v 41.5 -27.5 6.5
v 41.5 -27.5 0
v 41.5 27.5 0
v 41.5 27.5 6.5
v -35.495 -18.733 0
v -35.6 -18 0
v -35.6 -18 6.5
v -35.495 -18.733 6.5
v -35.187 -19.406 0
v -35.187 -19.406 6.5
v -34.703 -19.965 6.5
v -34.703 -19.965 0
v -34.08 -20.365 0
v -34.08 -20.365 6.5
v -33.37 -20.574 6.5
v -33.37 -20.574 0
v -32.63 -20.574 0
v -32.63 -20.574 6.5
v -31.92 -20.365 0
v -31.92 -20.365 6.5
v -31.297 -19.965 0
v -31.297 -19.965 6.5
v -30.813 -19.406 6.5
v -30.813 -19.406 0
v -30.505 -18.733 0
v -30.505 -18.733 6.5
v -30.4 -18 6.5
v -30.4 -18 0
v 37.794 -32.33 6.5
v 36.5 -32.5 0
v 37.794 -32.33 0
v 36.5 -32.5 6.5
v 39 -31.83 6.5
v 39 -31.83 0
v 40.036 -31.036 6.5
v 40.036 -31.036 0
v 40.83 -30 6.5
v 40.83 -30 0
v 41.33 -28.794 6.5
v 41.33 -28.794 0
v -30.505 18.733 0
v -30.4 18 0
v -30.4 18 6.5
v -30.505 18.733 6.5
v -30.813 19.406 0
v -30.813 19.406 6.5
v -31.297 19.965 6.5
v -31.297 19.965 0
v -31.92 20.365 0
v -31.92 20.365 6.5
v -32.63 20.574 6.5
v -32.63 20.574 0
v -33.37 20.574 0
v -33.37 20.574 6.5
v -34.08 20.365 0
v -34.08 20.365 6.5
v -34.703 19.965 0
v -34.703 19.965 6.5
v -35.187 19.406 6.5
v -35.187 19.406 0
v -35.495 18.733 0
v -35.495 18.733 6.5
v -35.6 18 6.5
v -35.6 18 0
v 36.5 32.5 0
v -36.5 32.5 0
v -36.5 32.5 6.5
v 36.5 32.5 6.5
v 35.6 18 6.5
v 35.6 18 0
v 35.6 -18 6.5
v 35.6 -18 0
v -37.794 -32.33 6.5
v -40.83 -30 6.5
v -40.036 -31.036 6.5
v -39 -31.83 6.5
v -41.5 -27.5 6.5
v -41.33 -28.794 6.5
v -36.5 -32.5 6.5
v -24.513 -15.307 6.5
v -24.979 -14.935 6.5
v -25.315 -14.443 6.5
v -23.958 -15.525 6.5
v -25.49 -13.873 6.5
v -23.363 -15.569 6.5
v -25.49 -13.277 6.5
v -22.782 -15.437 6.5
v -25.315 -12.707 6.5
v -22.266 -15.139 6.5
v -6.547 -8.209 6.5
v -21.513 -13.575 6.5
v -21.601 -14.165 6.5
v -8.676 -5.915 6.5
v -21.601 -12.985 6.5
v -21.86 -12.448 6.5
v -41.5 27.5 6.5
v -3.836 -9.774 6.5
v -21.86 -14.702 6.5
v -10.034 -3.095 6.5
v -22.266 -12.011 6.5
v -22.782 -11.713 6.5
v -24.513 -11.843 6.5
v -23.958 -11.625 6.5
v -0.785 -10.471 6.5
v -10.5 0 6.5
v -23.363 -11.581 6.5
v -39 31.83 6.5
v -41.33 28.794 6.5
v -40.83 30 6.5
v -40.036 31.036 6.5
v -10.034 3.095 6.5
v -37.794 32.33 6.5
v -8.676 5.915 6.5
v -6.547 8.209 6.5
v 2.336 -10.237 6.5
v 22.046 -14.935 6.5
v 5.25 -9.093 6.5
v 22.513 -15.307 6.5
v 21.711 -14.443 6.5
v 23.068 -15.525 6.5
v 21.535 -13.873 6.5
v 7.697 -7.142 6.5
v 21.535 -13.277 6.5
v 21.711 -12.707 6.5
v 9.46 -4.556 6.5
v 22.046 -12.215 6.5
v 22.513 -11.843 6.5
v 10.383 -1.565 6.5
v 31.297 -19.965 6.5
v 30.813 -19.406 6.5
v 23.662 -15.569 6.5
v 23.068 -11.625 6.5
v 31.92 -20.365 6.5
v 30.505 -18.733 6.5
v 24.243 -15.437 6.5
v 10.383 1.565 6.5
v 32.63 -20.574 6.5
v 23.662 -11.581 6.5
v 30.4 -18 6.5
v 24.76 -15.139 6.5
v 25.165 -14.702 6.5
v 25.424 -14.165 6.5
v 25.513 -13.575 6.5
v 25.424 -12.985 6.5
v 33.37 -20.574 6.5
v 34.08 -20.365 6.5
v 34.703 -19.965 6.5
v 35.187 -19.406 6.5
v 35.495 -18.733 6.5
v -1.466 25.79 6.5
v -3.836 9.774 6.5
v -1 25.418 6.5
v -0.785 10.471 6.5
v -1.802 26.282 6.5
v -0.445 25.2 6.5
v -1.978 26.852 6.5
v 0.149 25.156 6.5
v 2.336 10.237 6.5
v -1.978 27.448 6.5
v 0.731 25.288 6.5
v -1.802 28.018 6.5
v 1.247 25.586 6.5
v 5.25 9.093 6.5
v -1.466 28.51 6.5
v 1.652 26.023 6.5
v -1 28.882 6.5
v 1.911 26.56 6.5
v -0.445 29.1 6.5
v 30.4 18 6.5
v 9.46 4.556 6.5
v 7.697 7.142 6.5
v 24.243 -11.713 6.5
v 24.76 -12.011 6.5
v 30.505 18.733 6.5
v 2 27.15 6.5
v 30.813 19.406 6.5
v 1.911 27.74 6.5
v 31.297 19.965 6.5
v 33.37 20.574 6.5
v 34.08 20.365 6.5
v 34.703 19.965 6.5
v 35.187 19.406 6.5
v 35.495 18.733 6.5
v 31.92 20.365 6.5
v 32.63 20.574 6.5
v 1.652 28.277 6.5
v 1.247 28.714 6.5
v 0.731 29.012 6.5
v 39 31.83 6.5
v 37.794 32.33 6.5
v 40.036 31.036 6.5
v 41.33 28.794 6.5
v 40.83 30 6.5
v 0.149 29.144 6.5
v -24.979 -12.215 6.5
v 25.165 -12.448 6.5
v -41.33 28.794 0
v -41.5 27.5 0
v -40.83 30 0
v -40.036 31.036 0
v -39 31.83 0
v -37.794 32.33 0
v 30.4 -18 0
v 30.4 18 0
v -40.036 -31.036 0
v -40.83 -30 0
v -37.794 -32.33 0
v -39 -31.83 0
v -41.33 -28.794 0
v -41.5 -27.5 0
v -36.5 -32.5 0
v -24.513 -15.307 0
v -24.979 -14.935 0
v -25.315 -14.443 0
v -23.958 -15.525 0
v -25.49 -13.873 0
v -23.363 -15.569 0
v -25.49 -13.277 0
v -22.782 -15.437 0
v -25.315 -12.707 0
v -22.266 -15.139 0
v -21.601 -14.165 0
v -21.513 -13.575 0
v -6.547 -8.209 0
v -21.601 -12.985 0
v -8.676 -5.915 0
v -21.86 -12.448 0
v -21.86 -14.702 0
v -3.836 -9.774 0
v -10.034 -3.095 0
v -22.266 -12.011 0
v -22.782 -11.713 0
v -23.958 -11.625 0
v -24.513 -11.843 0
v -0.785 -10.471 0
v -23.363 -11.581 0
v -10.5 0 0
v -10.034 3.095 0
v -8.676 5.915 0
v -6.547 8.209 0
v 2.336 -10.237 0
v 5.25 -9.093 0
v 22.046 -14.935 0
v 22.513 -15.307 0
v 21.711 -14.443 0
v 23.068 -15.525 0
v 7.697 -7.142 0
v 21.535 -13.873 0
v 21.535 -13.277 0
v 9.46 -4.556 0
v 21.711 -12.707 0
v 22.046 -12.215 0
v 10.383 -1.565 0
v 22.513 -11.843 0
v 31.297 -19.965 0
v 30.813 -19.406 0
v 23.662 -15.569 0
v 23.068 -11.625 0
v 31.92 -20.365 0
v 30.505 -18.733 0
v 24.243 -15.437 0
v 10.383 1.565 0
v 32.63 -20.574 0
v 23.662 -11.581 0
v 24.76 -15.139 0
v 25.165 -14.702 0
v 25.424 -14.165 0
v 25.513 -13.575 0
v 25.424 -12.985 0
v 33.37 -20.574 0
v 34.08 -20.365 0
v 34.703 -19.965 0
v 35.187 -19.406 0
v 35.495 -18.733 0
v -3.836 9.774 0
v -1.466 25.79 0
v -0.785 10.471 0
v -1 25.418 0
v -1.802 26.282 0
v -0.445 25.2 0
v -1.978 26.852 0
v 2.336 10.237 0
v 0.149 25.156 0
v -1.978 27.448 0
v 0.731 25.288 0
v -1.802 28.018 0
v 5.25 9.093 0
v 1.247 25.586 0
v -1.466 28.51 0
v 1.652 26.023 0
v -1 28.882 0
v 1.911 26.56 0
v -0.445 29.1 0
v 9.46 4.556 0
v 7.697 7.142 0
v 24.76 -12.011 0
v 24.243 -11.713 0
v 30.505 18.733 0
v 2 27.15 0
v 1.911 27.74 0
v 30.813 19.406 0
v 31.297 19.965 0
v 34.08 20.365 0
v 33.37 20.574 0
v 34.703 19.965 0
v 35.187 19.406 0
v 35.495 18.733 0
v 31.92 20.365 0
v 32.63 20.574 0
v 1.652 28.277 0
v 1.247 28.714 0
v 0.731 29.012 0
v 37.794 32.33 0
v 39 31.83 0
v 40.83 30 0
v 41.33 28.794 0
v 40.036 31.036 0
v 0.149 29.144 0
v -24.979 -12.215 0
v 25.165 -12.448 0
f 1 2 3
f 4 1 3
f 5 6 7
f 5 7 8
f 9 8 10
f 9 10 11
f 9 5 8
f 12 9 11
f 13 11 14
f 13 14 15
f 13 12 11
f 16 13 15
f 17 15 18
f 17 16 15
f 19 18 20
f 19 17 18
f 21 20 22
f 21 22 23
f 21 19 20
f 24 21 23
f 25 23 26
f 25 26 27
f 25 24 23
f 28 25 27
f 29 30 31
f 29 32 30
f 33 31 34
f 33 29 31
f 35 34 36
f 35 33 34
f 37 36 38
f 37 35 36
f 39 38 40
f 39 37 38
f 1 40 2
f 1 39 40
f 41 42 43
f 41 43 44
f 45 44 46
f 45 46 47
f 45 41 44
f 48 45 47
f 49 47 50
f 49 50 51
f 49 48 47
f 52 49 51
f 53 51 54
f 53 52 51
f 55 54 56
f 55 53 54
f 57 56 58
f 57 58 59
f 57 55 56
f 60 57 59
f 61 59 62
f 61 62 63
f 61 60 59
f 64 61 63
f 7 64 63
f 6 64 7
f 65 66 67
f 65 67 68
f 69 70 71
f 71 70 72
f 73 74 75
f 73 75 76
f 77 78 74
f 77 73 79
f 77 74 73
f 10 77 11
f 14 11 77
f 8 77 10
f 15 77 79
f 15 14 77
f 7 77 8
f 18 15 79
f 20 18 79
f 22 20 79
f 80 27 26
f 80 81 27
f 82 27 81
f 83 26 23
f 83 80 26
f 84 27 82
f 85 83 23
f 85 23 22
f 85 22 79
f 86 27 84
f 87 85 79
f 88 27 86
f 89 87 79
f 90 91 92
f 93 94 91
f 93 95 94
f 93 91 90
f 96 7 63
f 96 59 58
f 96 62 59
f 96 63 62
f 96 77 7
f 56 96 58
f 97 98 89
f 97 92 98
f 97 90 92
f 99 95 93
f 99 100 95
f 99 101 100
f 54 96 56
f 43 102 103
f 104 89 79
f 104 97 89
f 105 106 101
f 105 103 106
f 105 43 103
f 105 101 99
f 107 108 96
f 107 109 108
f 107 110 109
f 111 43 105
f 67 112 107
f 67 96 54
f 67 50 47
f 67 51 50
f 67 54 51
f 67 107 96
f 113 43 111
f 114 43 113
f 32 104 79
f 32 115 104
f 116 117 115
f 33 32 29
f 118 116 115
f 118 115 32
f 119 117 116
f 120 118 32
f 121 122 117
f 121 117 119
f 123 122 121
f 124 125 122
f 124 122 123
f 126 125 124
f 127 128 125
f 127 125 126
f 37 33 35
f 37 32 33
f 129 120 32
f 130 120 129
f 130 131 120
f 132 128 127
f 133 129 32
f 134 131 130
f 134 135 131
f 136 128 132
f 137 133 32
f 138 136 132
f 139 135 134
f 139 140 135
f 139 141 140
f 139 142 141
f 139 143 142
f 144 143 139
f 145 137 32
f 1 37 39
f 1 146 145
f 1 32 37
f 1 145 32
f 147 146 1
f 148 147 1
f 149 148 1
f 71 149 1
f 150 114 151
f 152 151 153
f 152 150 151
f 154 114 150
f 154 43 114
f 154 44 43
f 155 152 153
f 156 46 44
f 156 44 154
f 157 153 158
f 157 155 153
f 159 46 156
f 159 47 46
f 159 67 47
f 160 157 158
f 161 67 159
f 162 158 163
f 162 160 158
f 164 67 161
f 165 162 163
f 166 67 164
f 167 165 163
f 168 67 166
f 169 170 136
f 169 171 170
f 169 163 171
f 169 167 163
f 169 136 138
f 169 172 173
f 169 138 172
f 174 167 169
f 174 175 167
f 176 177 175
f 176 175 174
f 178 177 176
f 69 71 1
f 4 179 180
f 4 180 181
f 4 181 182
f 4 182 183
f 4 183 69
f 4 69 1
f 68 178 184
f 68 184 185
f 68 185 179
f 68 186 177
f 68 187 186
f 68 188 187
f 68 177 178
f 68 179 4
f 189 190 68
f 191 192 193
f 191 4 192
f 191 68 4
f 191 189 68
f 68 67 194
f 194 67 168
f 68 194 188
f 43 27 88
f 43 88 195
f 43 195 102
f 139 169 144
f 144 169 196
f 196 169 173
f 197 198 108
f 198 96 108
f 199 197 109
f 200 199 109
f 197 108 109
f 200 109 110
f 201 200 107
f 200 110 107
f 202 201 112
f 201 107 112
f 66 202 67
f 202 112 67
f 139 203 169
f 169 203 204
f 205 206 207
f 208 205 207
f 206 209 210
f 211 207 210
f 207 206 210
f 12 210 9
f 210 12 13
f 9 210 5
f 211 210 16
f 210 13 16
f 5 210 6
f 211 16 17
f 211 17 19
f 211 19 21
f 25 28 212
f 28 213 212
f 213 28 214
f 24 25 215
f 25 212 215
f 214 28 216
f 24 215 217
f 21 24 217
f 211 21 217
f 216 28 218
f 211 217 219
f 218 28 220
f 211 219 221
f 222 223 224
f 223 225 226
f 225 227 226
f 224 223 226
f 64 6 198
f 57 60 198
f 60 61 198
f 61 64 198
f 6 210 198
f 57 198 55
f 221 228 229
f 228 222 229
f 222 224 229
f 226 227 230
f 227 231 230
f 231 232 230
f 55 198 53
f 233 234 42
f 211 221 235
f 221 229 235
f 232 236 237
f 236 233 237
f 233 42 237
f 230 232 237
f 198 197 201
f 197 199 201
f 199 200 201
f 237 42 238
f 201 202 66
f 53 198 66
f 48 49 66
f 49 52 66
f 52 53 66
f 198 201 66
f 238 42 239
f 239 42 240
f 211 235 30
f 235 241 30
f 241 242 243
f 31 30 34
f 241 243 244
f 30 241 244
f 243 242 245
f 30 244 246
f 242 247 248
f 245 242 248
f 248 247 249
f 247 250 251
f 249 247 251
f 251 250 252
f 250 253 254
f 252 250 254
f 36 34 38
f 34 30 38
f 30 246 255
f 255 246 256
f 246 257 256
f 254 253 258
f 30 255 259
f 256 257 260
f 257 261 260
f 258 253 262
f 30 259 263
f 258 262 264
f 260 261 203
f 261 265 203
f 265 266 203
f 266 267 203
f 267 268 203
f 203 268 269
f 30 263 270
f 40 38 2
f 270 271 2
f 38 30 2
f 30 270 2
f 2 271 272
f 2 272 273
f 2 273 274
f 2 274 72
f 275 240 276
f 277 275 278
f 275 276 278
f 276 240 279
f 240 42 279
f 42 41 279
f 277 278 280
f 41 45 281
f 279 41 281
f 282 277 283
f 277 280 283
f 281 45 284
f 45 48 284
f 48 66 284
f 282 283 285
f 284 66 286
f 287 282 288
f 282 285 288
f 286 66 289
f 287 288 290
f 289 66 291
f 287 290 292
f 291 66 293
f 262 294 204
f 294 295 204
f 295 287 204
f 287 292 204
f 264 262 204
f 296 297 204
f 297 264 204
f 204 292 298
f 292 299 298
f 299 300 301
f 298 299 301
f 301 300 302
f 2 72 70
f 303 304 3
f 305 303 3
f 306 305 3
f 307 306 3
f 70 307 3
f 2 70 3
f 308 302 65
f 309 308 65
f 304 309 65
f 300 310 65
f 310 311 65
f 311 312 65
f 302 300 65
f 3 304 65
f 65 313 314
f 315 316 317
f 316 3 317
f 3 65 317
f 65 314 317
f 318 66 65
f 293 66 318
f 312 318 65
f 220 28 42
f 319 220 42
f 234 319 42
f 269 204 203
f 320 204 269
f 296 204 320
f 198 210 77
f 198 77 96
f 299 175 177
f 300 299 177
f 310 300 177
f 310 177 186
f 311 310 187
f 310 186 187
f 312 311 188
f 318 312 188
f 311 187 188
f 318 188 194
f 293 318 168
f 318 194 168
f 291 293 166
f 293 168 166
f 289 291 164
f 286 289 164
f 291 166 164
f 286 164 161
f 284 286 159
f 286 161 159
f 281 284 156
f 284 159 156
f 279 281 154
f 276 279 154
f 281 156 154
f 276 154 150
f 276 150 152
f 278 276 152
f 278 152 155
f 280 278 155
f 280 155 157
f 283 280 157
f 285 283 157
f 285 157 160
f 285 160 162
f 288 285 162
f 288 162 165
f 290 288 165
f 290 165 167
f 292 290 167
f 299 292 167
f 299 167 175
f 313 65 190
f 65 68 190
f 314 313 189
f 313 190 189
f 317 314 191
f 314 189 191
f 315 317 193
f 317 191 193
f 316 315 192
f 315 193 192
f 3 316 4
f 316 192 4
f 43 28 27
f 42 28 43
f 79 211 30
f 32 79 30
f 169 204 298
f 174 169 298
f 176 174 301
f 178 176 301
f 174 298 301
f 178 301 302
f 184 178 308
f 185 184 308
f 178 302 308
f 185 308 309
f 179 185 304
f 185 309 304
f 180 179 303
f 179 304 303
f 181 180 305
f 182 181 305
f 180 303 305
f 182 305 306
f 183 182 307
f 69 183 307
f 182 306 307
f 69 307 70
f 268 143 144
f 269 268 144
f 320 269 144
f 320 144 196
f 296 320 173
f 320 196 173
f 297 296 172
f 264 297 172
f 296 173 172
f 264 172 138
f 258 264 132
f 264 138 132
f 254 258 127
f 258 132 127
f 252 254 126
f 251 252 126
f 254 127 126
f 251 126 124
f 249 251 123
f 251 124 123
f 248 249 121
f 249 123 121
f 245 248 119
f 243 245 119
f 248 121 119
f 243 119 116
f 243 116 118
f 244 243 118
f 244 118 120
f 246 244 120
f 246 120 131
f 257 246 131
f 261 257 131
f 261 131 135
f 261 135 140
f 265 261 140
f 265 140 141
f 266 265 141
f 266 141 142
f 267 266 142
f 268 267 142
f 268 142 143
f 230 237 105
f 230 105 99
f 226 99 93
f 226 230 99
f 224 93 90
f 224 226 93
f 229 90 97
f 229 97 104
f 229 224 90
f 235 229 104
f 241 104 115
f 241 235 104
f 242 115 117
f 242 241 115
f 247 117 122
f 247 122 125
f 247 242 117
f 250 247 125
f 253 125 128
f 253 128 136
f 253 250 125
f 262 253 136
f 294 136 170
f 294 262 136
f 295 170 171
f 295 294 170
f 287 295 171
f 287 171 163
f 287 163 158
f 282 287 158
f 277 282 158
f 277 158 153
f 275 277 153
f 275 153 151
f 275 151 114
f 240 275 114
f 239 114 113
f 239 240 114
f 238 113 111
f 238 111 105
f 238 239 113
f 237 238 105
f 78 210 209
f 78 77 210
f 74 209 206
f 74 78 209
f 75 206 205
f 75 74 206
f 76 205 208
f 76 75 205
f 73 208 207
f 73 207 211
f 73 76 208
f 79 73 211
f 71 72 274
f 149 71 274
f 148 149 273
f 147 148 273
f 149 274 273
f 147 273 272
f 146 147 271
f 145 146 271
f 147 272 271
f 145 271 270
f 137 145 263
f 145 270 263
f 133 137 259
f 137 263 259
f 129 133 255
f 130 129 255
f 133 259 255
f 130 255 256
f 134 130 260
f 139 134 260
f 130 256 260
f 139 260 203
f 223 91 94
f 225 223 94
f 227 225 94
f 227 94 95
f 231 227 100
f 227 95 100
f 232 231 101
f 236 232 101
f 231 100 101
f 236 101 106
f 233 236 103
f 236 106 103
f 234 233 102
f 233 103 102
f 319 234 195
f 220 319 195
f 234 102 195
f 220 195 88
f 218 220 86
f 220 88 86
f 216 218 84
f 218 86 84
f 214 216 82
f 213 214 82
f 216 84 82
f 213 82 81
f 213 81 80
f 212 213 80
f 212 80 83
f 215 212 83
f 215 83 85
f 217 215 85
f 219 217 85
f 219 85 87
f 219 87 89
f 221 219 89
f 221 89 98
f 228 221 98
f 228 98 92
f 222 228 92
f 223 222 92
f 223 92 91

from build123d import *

# Parameters (mm, degrees)
SKETCH1_W           = 83
SKETCH1_H           = 65
SKETCH1_R           = 10.5
BOSS_EXTRUDE1_DEPTH = 6.5
FILLET1_R           = 5
SKETCH2_R           = 2
CUT_EXTRUDE1_DEPTH  = 10


with BuildPart() as part:
    # Sketch1 → Boss-Extrude1 (new body)
    with BuildSketch(Plane.XY):
        Rectangle(SKETCH1_W, SKETCH1_H)
        with Locations(Location((0, 0, 0), (0, 0, 180))):
            Circle(SKETCH1_R, mode=Mode.SUBTRACT)
        with BuildLine():
            Line((30.4, -18), (30.4, 18))
            ThreePointArc((30.4, 18), (33, 20.6), (35.6, 18))
            Line((35.6, 18), (35.6, -18))
            ThreePointArc((35.6, -18), (33, -20.6), (30.4, -18))
        make_face(mode=Mode.SUBTRACT)
        with BuildLine():
            Line((-30.4, -18), (-30.4, 18))
            ThreePointArc((-30.4, 18), (-33, 20.6), (-35.6, 18))
            Line((-35.6, 18), (-35.6, -18))
            ThreePointArc((-35.6, -18), (-33, -20.6), (-30.4, -18))
        make_face(mode=Mode.SUBTRACT)
    extrude(amount=BOSS_EXTRUDE1_DEPTH)

    # Fillet1
    fillet1_edges = [part.edges().sort_by_distance(p)[0] for p in [
        (-41.5, -32.5, 3.25),
        (-41.5, 32.5, 3.25),
        (41.5, 32.5, 3.25),
        (41.5, -32.5, 3.25),
    ]]
    fillet(fillet1_edges, radius=FILLET1_R)

    # Sketch2 → Cut-Extrude1 (cut)
    with BuildSketch(Plane.XY.offset(6.5)):
        with Locations((0, 27.15)):
            Circle(SKETCH2_R)
        with Locations((23.512589713, -13.575)):
            Circle(SKETCH2_R)
        with Locations((-23.512589713, -13.575)):
            Circle(SKETCH2_R)
    extrude(amount=-CUT_EXTRUDE1_DEPTH, mode=Mode.SUBTRACT)


solid = part.part
